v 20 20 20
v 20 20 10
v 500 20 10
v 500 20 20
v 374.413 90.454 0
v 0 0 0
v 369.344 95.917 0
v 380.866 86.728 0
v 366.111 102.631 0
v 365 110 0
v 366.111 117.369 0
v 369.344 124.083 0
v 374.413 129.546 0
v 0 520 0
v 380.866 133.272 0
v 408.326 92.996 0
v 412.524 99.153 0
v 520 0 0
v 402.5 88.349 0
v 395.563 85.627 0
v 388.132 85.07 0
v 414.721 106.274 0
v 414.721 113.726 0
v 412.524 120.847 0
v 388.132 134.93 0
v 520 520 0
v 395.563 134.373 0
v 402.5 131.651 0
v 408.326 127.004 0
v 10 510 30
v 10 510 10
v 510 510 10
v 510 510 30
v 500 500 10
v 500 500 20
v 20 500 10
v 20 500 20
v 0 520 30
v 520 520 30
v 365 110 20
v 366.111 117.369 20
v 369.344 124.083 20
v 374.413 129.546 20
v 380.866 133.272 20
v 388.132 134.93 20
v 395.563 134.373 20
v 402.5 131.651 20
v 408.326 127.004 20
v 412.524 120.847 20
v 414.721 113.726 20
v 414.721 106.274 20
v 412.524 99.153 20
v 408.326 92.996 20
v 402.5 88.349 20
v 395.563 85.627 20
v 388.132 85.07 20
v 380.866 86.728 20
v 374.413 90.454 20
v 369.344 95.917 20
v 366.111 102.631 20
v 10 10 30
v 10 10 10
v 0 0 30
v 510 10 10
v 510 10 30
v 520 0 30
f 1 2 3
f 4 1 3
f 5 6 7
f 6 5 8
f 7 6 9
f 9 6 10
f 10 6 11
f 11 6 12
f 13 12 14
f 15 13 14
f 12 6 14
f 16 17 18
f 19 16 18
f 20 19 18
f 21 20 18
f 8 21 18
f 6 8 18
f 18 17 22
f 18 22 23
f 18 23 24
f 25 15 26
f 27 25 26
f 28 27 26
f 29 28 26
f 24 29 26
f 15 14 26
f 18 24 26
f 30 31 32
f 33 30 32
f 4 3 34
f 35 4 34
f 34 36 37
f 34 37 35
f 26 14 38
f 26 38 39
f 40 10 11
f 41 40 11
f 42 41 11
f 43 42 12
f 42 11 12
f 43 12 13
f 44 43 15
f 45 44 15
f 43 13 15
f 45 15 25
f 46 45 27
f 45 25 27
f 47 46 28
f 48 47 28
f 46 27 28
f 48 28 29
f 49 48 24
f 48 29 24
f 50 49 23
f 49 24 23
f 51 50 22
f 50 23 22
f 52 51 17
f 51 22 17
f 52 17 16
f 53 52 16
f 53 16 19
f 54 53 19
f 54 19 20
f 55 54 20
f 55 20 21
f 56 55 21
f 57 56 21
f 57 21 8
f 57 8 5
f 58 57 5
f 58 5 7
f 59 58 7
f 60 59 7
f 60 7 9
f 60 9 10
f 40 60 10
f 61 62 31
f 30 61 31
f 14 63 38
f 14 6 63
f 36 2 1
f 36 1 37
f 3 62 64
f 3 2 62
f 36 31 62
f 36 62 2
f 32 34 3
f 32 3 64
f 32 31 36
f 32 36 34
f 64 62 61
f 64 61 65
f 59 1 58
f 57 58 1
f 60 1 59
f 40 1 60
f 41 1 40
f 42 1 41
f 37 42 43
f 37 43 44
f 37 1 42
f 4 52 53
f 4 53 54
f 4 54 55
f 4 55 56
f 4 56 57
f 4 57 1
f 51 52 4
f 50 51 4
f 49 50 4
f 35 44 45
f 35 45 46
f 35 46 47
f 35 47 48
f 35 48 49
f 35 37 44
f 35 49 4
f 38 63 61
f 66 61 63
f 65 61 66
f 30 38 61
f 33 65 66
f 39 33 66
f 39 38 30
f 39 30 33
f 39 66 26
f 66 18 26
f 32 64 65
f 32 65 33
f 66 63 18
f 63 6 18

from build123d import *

# Parameters (mm, degrees)
ESQUISSE1_W             = 520
ESQUISSE1_H             = 520
BOSS_EXTRU_1_DEPTH      = 10
ESQUISSE2_W             = 480
ESQUISSE2_H             = 480
BOSS_EXTRU_2_DEPTH      = 10
ESQUISSE3_W             = 520
ESQUISSE3_H             = 520
ESQUISSE3_W_2           = 500
ESQUISSE3_H_2           = 500
BOSS_EXTRU_3_DEPTH      = 20
ESQUISSE4_R             = 25
ENL_V_MAT_EXTRU_1_DEPTH = 737.002717386


with BuildPart() as part:
    # Esquisse1 → Boss.-Extru.1 (new body)
    with BuildSketch(Plane.XY):
        with Locations((260, 260)):
            Rectangle(ESQUISSE1_W, ESQUISSE1_H)
    extrude(amount=BOSS_EXTRU_1_DEPTH)

    # Esquisse2 → Boss.-Extru.2 (add)
    with BuildSketch(Plane.XY.offset(10)):
        with Locations((260, 260)):
            Rectangle(ESQUISSE2_W, ESQUISSE2_H)
    extrude(amount=BOSS_EXTRU_2_DEPTH)

    # Esquisse3 → Boss.-Extru.3 (add)
    with BuildSketch(Plane.XY.offset(10)):
        with Locations((260, 260)):
            Rectangle(ESQUISSE3_W, ESQUISSE3_H)
        with Locations((260, 260)):
            Rectangle(ESQUISSE3_W_2, ESQUISSE3_H_2, mode=Mode.SUBTRACT)
    extrude(amount=BOSS_EXTRU_3_DEPTH)

    # Esquisse4 → Enlèv. mat.-Extru.1 (cut, through all)
    with BuildSketch(Plane(origin=(0, 0, 0), x_dir=(-1, 0, 0), z_dir=(0, 0, -1))):
        with Locations((-390, 110)):
            Circle(ESQUISSE4_R)
    extrude(amount=-ENL_V_MAT_EXTRU_1_DEPTH, mode=Mode.SUBTRACT)


solid = part.part
